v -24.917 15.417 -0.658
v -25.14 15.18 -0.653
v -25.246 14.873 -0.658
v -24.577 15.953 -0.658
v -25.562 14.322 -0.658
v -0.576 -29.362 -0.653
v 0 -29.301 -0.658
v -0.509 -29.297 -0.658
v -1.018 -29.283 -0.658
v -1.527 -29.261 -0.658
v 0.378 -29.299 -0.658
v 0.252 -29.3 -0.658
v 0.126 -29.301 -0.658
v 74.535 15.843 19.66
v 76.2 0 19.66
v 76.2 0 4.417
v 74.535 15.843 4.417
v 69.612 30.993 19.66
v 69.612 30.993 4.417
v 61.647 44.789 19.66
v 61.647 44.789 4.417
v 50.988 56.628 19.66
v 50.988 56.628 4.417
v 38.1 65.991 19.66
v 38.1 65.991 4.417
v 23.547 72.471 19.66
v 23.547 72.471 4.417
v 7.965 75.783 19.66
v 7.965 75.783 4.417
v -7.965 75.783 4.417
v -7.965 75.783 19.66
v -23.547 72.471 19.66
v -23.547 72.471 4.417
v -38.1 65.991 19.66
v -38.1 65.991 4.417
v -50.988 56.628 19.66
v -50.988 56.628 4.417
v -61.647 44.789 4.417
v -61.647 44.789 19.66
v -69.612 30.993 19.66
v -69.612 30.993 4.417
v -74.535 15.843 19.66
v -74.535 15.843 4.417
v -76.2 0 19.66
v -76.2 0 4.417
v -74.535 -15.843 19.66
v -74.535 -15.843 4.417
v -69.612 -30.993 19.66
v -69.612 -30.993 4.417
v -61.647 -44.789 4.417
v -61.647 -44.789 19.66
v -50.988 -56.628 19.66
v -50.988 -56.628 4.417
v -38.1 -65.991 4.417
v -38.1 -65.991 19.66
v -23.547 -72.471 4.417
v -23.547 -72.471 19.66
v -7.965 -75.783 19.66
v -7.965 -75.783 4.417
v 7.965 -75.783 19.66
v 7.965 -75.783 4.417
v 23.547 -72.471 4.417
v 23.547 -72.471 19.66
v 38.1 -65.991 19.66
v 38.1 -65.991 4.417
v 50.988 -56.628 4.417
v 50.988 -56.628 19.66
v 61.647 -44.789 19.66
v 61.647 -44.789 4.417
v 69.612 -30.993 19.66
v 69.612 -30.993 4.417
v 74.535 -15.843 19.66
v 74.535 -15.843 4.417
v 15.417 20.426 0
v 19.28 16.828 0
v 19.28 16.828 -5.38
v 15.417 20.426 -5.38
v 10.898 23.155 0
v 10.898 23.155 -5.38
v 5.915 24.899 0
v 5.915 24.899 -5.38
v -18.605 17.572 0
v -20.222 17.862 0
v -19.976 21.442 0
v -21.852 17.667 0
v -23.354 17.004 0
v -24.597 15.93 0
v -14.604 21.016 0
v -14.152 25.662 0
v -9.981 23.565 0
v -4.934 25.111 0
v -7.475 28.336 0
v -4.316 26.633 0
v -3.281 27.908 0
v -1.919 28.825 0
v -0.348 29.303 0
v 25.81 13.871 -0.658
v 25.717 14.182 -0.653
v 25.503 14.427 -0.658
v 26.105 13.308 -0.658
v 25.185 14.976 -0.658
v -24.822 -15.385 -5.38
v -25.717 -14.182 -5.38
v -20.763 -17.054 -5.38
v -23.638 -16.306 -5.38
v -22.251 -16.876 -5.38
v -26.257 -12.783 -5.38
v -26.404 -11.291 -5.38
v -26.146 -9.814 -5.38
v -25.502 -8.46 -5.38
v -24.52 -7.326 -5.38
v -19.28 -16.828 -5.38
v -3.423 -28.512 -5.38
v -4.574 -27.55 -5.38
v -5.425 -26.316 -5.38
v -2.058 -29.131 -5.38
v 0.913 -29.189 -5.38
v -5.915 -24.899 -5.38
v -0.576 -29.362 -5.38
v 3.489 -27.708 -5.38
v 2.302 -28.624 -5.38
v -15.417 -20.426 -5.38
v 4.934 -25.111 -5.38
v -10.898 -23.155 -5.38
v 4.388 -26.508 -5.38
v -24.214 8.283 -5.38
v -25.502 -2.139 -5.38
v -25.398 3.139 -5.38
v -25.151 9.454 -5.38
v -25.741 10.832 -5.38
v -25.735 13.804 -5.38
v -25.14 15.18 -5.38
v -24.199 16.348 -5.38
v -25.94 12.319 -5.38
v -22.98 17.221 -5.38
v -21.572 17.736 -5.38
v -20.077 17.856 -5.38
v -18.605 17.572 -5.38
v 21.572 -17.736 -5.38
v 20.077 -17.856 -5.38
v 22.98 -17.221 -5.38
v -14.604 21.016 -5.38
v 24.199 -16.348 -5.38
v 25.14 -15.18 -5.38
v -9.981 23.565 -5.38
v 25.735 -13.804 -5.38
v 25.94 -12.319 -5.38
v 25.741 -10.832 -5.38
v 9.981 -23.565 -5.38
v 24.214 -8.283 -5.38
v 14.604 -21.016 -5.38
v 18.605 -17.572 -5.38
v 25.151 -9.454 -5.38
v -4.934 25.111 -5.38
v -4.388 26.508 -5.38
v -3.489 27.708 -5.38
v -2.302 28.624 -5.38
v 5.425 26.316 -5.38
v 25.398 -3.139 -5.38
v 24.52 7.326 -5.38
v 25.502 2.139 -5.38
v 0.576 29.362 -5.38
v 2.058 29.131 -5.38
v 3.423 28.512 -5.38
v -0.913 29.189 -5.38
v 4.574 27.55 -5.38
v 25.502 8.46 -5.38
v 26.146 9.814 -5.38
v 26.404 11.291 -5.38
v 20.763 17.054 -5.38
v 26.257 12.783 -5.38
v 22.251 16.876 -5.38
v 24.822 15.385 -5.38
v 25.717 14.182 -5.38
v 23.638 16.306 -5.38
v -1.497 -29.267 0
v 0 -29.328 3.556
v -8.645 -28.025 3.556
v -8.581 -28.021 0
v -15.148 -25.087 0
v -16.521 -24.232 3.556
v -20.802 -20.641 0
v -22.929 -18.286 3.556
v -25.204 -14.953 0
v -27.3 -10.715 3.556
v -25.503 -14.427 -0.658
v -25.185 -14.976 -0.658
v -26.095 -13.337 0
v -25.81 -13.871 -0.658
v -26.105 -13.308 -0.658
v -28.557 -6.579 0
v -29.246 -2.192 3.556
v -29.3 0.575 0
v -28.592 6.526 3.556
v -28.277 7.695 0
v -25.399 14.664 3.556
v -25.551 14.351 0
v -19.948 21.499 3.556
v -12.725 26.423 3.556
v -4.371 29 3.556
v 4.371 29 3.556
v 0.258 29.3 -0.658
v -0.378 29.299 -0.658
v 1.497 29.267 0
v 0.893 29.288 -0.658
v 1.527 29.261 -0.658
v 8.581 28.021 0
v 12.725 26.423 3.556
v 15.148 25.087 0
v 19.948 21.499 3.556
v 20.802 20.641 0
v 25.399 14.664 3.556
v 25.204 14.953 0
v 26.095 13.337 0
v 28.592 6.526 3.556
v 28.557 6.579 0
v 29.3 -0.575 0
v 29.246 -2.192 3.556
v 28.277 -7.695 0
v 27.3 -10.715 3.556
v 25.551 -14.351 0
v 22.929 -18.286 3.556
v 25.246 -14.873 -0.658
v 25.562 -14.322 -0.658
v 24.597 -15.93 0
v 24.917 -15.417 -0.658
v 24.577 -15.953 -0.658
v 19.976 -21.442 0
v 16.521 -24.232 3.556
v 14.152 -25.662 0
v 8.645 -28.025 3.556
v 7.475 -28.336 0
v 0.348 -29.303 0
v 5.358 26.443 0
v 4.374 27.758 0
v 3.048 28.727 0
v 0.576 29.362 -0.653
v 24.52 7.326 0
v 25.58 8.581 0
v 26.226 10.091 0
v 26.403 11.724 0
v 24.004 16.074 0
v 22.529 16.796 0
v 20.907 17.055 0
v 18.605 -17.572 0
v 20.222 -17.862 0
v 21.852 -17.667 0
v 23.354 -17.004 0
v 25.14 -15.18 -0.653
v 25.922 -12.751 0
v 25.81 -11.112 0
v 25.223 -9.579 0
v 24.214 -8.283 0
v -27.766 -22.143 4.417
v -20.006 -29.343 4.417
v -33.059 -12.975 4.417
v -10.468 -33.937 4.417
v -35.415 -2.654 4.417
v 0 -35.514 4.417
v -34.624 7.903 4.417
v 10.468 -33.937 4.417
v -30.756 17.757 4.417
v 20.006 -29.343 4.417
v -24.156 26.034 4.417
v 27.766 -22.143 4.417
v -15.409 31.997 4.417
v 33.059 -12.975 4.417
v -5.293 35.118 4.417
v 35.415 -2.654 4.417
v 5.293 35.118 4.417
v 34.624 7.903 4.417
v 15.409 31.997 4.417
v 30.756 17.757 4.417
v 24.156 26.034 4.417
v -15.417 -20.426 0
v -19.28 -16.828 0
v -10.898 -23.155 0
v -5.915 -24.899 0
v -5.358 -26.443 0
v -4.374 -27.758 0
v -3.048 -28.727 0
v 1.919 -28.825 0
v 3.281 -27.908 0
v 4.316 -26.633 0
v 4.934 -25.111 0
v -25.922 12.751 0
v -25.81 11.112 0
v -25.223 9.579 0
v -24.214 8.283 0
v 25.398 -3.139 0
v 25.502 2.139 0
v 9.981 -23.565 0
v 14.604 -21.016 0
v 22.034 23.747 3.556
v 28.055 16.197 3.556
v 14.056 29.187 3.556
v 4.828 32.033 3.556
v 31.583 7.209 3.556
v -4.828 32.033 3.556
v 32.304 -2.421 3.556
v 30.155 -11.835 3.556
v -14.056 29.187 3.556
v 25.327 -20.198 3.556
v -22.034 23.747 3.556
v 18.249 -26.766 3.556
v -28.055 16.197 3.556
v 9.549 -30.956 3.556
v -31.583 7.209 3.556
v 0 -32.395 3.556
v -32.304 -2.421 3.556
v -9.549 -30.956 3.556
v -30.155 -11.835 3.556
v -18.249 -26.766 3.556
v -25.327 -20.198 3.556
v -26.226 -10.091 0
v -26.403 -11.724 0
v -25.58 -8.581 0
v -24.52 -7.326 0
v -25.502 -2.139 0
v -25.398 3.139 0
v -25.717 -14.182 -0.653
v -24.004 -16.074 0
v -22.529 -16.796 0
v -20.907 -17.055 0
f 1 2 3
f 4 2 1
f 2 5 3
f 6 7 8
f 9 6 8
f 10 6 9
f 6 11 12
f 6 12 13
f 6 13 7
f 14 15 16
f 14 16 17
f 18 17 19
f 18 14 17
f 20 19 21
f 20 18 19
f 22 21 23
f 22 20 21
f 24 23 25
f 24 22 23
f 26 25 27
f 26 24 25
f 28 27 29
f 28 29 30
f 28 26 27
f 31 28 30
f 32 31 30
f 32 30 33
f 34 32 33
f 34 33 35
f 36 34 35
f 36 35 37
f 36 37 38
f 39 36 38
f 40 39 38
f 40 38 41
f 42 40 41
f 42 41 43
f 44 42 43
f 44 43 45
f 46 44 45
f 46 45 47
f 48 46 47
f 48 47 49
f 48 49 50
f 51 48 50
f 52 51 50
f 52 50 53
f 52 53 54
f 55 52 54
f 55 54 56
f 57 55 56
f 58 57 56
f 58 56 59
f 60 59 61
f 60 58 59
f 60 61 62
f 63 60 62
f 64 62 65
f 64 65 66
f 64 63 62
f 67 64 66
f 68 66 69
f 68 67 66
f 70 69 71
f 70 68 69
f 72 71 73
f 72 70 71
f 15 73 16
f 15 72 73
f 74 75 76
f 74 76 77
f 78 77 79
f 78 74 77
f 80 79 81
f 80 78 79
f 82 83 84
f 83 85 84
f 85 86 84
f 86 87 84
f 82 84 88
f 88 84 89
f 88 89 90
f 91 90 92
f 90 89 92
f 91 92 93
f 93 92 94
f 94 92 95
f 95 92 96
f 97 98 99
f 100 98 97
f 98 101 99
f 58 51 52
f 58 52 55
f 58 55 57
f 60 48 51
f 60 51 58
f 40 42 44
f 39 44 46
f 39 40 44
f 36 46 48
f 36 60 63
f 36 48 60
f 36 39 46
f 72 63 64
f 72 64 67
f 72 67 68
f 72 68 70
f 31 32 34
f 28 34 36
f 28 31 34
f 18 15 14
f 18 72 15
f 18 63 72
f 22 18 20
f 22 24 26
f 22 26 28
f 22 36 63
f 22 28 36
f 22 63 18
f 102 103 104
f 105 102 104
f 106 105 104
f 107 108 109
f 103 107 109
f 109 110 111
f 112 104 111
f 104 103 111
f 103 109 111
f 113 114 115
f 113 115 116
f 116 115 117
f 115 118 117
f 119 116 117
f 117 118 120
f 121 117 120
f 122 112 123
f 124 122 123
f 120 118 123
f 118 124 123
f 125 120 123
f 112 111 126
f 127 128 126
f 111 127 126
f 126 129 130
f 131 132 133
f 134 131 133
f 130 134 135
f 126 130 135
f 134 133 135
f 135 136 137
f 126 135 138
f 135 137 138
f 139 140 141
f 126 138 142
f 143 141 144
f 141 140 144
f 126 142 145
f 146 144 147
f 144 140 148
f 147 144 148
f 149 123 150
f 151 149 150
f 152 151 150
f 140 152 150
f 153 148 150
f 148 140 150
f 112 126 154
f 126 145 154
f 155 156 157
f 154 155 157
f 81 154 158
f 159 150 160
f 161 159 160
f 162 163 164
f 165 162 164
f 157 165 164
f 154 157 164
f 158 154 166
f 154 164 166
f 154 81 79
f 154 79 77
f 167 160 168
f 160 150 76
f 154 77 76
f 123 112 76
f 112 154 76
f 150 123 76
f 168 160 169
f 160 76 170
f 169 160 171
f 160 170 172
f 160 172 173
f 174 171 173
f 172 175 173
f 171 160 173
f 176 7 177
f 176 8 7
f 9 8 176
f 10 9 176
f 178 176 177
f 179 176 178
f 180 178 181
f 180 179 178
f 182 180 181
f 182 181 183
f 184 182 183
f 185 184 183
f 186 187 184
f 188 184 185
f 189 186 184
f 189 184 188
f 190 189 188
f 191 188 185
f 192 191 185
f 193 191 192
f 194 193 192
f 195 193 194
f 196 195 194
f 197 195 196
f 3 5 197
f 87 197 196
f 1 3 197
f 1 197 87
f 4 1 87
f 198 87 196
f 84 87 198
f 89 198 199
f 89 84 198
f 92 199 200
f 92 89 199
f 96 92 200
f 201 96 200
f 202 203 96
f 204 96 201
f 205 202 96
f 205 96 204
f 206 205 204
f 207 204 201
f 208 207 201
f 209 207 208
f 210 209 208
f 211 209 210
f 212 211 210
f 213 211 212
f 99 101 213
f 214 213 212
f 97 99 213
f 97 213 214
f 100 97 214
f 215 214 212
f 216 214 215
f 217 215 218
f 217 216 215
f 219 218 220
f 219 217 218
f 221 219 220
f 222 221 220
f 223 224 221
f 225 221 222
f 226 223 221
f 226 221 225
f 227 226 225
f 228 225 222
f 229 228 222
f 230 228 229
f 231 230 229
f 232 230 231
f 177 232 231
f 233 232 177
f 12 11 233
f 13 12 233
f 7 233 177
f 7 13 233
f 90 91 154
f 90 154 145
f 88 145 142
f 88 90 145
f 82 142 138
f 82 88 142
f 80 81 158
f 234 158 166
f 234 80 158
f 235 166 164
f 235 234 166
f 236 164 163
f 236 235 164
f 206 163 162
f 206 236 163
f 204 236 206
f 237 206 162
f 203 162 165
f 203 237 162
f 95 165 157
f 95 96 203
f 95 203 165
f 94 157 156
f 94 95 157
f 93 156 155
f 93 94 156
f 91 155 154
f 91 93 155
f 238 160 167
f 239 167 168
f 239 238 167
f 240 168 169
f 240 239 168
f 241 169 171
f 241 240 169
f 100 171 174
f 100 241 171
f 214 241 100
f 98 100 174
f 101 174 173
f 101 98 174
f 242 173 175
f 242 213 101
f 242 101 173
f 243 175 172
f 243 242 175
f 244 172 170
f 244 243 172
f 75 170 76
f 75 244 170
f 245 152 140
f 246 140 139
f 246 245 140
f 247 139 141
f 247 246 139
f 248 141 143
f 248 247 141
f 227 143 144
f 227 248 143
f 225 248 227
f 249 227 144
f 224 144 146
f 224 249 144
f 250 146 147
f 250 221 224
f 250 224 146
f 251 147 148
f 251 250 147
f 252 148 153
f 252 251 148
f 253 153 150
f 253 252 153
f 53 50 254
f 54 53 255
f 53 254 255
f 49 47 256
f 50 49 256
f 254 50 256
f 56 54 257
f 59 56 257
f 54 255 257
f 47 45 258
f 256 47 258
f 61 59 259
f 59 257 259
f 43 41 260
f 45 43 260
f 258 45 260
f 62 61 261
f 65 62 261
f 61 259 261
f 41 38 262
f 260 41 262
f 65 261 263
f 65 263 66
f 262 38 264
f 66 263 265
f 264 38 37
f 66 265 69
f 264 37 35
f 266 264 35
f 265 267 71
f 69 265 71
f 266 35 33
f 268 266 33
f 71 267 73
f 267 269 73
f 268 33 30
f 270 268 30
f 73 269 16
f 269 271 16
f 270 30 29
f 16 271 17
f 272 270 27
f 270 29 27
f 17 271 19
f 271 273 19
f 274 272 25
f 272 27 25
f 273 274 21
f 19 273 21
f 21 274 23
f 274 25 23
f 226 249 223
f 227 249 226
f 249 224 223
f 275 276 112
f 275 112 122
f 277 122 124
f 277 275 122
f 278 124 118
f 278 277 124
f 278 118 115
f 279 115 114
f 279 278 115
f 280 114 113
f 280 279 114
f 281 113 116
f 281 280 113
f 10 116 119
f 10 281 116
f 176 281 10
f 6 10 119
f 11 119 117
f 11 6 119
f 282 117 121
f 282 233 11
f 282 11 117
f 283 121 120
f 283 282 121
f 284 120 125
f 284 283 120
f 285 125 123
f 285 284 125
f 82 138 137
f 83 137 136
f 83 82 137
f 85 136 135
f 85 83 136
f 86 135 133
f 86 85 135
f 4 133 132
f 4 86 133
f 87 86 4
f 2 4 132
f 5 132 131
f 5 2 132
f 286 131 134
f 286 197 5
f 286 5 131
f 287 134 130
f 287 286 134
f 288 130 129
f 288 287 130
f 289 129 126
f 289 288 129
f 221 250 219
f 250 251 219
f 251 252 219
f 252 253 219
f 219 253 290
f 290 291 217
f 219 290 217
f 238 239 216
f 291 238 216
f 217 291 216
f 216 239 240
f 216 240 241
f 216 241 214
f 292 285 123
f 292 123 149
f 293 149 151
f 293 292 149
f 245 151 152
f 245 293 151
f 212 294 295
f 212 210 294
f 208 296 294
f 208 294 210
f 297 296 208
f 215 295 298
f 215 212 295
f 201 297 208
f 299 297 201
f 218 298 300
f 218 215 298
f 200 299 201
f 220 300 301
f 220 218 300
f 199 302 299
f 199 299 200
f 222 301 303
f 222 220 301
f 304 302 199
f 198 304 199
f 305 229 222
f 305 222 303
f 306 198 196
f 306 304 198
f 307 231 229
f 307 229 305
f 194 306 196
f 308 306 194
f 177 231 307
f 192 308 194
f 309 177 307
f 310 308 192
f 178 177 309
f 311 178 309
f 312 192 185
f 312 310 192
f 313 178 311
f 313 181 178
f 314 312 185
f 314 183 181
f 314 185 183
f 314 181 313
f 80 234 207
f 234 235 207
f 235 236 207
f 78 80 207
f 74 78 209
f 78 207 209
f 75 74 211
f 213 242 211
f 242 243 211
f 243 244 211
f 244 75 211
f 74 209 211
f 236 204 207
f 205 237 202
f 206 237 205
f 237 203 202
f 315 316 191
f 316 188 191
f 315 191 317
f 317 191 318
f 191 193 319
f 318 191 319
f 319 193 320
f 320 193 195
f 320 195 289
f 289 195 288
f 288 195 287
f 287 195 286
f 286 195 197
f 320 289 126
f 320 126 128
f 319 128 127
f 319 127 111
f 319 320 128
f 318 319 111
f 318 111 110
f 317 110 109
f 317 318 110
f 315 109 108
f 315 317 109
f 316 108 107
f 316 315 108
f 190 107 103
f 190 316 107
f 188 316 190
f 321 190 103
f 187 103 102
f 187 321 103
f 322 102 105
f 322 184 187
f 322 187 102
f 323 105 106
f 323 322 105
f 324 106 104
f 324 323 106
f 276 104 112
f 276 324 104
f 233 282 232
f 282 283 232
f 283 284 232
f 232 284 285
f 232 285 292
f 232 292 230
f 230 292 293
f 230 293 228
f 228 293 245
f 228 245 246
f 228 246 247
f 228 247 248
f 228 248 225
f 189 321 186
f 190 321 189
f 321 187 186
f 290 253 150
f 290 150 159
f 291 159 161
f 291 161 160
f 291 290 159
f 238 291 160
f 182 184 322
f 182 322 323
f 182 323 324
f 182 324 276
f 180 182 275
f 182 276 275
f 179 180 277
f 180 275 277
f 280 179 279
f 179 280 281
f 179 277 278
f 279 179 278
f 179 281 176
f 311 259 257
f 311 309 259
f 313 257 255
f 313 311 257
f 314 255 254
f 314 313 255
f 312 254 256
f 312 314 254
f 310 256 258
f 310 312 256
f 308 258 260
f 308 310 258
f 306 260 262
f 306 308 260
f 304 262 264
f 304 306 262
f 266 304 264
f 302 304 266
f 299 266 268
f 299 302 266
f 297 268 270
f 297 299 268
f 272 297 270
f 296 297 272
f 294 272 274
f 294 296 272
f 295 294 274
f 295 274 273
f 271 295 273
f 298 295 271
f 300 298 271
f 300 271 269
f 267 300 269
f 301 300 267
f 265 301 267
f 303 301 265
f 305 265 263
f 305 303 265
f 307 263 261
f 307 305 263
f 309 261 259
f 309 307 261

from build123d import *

# Parameters (mm, degrees)
SKETCH1_R           = 40.564550707
BOSS_EXTRUDE1_DEPTH = 10
BOSS_EXTRUDE2_DEPTH = 5.38
SKETCH5_R           = 76.2
BOSS_EXTRUDE3_DEPTH = 5.583348686
BOSS_EXTRUDE4_START = 9.66
SKETCH5_2_R         = 76.2
BOSS_EXTRUDE4_DEPTH = 9.66


with BuildPart() as part:
    # Sketch1 → Boss-Extrude1 (new body)
    with BuildSketch(Plane.XY):
        Circle(SKETCH1_R)
    extrude(amount=BOSS_EXTRUDE1_DEPTH)

    # Sketch2 → Boss-Extrude2 (add)
    with BuildSketch(Plane(origin=(0, 0, 0), x_dir=(-1, 0, 0), z_dir=(0, 0, -1))):
        with BuildLine():
            ThreePointArc((18.605098838, 17.572080057), (25.140246466, 15.180270653), (24.214003726, 8.283098686))
            ThreePointArc((24.214003726, 8.283098686), (25.586626057, 0.502262214), (24.520417146, -7.326448205))
            ThreePointArc((24.520417146, -7.326448205), (25.716623254, -14.181956771), (19.280375747, -16.828393011))
            ThreePointArc((19.280375747, -16.828393011), (13.228284865, -21.907537055), (5.915318308, -24.898528262))
            ThreePointArc((5.915318308, -24.898528262), (0.576376788, -29.362227423), (-4.933627979, -25.111491697))
            ThreePointArc((-4.933627979, -25.111491697), (-12.358341192, -22.409799269), (-18.605098838, -17.572080057))
            ThreePointArc((-18.605098838, -17.572080057), (-25.140246466, -15.180270653), (-24.214003726, -8.283098686))
            ThreePointArc((-24.214003726, -8.283098686), (-25.586626057, -0.502262214), (-24.520417146, 7.326448205))
            ThreePointArc((-24.520417146, 7.326448205), (-25.716623254, 14.181956771), (-19.280375747, 16.828393011))
            ThreePointArc((-19.280375747, 16.828393011), (-13.228284865, 21.907537055), (-5.915318308, 24.898528262))
            ThreePointArc((-5.915318308, 24.898528262), (-0.576376788, 29.362227423), (4.933627979, 25.111491697))
            ThreePointArc((4.933627979, 25.111491697), (12.358341192, 22.409799269), (18.605098838, 17.572080057))
        make_face()
    extrude(amount=BOSS_EXTRUDE2_DEPTH)

    # Sketch4 → Cut-Revolve2 (revolve, cut)
    with BuildSketch(Plane(origin=(0, 0, 0), x_dir=(0, 0, -1), z_dir=(0.9998069773781536, -0.01964708594067849, 0)), mode=Mode.PRIVATE) as cut_revolve2_sk:
        Polygon((0.153479633, 36.092584483), (0.153479633, 40.603125703), (-4.416651314, 40.603125703), (-4.416651314, 35.514398024), (-3.556, 32.394803966), (-3.556, 29.327755228), (0.657751111, 29.301116836), align=None)
    revolve(cut_revolve2_sk.sketch.rotate(Axis((0, 0, 95.775716375), (0, 0, -1)), 178.874232462), axis=Axis((0, 0, 95.775716375), (0, 0, -1)), mode=Mode.SUBTRACT)

    # Sketch5 → Boss-Extrude3 (add)
    with BuildSketch(Plane.XY.offset(10)):
        Circle(SKETCH5_R)
    extrude(amount=-BOSS_EXTRUDE3_DEPTH)

    # Sketch5<2> → Boss-Extrude4 (add)
    with BuildSketch(Plane.XY.offset(10).offset(BOSS_EXTRUDE4_START)):
        Circle(SKETCH5_2_R)
    extrude(amount=-BOSS_EXTRUDE4_DEPTH)


solid = part.part
